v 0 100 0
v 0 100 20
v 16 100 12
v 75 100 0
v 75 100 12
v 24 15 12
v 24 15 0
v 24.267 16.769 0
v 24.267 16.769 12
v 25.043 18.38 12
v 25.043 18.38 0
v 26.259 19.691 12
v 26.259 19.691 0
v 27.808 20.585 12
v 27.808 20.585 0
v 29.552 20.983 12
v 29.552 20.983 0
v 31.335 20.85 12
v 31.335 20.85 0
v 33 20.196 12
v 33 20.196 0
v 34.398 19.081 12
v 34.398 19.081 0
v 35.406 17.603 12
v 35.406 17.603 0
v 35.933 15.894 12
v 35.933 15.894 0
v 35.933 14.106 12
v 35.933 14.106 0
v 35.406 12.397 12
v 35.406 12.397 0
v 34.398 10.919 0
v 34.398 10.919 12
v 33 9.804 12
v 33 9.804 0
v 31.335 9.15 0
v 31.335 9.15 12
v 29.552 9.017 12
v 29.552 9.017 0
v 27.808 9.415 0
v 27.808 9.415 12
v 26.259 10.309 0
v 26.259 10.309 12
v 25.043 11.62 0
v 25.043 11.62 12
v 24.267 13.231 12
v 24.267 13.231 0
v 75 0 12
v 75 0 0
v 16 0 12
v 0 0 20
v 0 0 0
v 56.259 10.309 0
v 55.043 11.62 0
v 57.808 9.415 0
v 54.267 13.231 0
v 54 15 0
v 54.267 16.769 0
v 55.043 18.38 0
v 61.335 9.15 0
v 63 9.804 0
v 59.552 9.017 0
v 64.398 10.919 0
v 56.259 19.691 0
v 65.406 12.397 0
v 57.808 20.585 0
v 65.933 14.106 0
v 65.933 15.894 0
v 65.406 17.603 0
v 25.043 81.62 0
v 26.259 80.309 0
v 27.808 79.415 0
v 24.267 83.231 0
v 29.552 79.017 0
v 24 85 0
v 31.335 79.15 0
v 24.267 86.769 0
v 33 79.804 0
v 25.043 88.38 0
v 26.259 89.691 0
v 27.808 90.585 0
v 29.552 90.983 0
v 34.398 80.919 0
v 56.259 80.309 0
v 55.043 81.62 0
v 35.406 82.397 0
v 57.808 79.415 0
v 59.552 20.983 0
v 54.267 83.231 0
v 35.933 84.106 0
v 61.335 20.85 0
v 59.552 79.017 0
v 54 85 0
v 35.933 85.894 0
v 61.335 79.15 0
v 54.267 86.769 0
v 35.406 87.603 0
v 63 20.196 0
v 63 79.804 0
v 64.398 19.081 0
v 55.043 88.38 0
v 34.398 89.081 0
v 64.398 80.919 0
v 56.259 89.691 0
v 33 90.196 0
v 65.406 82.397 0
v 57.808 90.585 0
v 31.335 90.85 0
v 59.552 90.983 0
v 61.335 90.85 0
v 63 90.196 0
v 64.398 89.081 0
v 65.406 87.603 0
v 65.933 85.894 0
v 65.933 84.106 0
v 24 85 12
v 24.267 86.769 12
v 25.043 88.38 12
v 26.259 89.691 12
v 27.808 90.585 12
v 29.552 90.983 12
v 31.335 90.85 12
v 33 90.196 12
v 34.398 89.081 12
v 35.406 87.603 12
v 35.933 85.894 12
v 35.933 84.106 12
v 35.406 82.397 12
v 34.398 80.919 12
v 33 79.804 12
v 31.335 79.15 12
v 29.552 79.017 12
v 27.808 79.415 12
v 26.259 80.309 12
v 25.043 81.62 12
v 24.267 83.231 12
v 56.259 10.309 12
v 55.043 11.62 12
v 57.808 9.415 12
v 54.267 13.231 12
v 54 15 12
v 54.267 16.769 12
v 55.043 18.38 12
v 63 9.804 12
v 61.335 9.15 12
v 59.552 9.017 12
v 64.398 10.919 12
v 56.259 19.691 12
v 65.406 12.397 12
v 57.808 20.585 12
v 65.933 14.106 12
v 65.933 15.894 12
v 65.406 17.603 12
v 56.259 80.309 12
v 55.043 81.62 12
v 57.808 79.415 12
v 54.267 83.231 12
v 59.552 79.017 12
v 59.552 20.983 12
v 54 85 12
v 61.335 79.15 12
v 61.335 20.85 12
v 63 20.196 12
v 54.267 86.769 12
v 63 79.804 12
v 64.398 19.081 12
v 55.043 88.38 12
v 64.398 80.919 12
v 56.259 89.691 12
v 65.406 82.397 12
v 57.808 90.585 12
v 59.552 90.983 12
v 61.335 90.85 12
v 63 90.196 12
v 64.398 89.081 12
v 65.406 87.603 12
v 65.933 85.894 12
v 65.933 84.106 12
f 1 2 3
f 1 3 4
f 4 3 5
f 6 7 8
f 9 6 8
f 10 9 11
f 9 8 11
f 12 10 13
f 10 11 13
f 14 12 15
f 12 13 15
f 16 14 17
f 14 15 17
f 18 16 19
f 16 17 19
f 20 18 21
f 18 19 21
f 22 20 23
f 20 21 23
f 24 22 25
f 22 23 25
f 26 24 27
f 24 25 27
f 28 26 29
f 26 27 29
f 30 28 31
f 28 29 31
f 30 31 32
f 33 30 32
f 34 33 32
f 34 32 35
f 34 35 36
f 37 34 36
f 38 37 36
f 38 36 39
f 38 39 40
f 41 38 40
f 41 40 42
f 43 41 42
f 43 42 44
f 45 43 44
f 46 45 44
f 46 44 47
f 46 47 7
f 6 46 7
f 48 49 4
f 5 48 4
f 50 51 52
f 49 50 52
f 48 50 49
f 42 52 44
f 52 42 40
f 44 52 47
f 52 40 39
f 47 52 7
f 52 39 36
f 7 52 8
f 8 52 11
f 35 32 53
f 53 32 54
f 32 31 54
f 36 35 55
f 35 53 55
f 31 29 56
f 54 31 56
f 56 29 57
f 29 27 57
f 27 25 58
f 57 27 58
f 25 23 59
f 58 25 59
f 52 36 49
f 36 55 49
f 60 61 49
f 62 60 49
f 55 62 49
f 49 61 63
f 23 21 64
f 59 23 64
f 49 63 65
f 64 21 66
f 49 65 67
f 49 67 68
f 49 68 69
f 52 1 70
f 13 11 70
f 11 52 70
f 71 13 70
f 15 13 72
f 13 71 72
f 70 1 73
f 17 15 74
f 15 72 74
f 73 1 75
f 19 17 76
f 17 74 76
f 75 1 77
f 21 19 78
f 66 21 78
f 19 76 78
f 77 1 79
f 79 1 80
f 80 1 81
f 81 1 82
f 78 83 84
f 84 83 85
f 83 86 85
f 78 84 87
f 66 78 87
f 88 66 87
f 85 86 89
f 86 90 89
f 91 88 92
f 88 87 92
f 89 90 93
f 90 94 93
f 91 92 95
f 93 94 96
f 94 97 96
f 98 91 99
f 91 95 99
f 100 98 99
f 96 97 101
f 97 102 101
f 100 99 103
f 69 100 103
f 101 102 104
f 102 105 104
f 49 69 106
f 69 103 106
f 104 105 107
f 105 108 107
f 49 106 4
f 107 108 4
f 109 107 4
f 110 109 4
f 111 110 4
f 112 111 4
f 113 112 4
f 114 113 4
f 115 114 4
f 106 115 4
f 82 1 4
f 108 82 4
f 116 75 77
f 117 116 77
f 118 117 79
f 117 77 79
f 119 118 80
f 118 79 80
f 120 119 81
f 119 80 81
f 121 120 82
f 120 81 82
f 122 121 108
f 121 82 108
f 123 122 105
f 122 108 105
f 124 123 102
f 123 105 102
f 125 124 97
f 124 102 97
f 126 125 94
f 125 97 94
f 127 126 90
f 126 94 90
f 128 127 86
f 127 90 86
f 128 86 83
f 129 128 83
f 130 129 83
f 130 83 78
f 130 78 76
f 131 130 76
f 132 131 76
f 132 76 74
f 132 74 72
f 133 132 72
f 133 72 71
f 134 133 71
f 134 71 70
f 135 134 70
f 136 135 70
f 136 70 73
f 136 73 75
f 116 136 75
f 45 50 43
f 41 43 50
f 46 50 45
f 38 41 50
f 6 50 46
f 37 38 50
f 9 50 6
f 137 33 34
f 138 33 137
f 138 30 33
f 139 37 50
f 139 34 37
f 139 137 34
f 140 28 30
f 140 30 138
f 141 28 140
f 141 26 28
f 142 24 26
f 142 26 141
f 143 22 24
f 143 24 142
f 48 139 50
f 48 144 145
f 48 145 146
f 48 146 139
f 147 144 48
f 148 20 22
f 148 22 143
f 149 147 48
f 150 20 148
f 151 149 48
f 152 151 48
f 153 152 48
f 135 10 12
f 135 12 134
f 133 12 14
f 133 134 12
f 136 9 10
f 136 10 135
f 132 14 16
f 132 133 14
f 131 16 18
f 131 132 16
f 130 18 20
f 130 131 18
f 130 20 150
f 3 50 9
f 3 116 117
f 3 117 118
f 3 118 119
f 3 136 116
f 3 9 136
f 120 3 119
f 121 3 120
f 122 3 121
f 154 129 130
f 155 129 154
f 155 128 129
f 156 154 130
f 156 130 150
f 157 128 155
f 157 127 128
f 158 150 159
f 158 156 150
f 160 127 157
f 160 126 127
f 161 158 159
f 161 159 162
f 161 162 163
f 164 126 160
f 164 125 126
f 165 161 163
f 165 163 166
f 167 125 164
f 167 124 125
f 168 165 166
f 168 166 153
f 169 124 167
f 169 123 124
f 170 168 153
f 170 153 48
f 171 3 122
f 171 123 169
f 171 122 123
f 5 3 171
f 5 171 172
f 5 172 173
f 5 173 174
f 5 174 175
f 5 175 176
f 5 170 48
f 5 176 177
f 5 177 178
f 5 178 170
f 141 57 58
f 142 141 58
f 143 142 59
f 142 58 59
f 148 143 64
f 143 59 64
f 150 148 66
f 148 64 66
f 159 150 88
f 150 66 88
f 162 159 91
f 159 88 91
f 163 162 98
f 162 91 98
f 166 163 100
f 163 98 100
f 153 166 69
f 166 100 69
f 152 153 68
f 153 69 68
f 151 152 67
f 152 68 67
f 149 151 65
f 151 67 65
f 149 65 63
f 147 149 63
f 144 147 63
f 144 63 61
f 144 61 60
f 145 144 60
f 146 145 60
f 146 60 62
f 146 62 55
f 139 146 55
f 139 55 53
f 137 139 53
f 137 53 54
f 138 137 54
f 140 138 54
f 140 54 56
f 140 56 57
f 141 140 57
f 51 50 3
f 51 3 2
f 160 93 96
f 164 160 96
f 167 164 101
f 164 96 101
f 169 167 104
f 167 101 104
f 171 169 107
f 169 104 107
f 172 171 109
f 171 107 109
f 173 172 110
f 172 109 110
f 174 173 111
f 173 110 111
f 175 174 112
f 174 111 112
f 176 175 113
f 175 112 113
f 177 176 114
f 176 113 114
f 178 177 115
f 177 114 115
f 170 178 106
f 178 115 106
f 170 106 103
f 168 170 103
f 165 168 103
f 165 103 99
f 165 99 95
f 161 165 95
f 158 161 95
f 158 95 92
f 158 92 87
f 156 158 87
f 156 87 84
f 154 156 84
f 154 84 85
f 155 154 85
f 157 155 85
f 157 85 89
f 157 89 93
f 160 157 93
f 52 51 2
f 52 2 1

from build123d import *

# Parameters (mm, degrees)
F0_W     = 75
F0_H     = 100
F1_DEPTH = 12
F4_DEPTH = 100
F6_D     = 12
F6_DEPTH = 12


with BuildPart() as f1:
    # F0 (on Top) → F1 (new body)
    with BuildSketch(Plane.XY):
        with Locations((37.5, 50)):
            Rectangle(F0_W, F0_H)
    extrude(amount=F1_DEPTH)

    # F3 (on face) → F4 (join)
    with BuildSketch(Plane.XZ):
        Polygon((0, 20), (0, 12), (16, 12), align=None)
    extrude(amount=-F4_DEPTH)

    # F6
    with Locations(Plane.XY.offset(12)):
        with Locations((30, 15), (60, 15), (60, 85), (30, 85)):
            Hole(F6_D / 2, depth=F6_DEPTH)


solid = f1.part
